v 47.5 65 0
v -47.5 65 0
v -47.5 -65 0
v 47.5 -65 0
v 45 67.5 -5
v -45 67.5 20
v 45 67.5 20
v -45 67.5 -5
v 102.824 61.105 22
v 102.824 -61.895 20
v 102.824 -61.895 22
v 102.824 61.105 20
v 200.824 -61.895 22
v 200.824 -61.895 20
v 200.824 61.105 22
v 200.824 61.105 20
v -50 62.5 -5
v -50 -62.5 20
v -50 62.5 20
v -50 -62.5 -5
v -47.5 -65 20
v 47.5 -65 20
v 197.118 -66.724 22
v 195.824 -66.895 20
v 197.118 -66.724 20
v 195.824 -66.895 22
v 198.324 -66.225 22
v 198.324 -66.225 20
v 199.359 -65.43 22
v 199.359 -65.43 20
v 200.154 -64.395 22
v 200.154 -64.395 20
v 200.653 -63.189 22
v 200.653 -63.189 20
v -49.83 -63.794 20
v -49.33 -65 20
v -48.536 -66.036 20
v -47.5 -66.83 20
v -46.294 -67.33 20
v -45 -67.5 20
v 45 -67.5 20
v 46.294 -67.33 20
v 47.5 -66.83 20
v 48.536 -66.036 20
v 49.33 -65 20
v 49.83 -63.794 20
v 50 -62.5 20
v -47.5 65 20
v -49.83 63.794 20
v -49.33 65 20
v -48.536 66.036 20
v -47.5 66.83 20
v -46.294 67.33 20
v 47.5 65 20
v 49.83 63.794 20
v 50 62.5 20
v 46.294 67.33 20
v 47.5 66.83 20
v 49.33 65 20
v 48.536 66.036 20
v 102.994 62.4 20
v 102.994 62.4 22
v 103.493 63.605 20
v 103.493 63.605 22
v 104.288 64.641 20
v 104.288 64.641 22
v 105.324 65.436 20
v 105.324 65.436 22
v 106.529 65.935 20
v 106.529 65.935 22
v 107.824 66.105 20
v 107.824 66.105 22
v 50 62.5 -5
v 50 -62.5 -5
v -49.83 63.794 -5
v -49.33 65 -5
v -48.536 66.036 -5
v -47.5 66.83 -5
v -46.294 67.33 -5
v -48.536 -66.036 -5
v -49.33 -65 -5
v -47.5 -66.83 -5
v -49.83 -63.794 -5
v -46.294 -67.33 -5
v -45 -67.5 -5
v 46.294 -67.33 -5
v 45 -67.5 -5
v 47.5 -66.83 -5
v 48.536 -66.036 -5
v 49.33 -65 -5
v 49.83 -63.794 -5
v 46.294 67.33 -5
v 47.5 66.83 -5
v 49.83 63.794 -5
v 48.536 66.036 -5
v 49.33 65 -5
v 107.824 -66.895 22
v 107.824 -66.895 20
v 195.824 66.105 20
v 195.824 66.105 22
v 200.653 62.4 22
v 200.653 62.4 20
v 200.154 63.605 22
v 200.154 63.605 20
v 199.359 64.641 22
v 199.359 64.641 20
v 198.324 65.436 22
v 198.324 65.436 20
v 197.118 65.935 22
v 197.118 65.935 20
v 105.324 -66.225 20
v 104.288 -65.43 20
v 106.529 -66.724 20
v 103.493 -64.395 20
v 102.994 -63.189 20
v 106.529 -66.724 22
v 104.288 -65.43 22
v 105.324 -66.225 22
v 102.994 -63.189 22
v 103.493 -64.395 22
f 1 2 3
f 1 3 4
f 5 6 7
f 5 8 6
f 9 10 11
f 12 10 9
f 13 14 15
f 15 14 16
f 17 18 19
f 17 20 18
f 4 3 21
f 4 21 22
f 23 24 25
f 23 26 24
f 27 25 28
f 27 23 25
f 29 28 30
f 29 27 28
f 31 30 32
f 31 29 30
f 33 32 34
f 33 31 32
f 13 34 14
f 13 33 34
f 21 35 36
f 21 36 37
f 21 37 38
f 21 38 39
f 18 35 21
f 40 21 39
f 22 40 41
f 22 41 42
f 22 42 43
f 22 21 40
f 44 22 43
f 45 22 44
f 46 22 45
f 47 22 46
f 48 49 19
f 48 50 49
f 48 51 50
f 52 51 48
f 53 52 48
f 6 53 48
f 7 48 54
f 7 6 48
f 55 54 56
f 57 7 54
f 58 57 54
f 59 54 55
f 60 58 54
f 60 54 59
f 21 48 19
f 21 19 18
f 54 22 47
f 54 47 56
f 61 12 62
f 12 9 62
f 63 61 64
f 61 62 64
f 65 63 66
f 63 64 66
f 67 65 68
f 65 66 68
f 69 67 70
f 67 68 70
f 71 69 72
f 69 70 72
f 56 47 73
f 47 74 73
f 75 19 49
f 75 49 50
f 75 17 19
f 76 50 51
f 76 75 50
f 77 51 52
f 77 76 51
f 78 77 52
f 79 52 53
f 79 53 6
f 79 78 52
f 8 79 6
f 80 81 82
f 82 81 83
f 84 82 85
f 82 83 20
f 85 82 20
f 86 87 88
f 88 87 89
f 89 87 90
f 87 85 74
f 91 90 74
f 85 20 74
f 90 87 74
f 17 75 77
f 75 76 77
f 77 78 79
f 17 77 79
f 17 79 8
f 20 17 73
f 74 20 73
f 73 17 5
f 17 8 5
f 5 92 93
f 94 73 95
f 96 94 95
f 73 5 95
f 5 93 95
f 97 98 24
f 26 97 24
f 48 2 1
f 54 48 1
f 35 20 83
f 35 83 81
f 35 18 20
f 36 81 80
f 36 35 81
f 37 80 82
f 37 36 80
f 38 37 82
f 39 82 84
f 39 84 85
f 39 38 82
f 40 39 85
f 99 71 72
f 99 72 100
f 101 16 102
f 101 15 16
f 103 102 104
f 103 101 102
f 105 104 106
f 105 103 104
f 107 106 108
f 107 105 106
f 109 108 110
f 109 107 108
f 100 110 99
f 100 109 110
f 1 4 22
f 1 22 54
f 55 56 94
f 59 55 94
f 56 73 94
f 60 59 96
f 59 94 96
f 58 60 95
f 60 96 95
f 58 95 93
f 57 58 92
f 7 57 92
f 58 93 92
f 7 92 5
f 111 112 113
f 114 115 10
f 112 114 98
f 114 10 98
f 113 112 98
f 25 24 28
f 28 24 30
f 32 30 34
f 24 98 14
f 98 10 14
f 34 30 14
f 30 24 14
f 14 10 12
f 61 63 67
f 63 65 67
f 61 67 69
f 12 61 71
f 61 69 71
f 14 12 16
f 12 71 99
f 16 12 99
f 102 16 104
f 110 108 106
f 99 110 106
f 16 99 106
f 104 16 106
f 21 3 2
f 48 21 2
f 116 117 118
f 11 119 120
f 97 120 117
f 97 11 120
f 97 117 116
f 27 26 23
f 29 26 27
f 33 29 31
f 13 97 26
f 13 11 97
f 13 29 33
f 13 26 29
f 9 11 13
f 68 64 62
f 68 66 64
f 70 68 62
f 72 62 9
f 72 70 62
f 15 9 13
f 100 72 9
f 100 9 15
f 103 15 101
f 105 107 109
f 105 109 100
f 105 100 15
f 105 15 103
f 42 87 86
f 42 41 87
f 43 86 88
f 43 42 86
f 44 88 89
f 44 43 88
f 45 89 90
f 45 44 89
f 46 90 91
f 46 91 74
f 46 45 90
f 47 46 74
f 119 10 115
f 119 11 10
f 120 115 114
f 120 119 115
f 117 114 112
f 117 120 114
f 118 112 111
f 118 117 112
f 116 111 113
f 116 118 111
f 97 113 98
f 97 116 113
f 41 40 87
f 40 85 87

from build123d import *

# Parameters (mm, degrees)
F0_W     = 100
F0_H     = 135
F1_DEPTH = 5
F2_W     = 100
F2_H     = 135
F2_W_2   = 95
F2_H_2   = 130
F3_DEPTH = 20
F4_R     = 5
F5_W     = 98
F5_H     = 133
F6_DEPTH = 2
F7_R     = 5


with BuildPart() as f1:
    # F0 (on Top) → F1 (new body)
    with BuildSketch(Plane.XY):
        Rectangle(F0_W, F0_H)
    extrude(amount=-F1_DEPTH)

    # F2 (on face) → F3 (join)
    with BuildSketch(Plane.XY):
        Rectangle(F2_W, F2_H)
        Rectangle(F2_W_2, F2_H_2, mode=Mode.SUBTRACT)
    extrude(amount=F3_DEPTH)

    # F4
    f4_edges = [f1.edges().sort_by_distance(p)[0] for p in [
        (50, -67.5, 7.5),
        (-50, -67.5, 7.5),
        (-50, 67.5, 7.5),
        (50, 67.5, 7.5),
    ]]
    fillet(f4_edges, radius=F4_R)


with BuildPart() as f6:
    # F5 (on face) → F6 (new body)
    with BuildSketch(Plane.XY.offset(20)):
        with Locations((151.823523, -0.394557)):
            Rectangle(F5_W, F5_H)
    extrude(amount=F6_DEPTH)

    # F7
    f7_edges = [f6.edges().sort_by_distance(p)[0] for p in [
        (102.823523, -66.894557, 21),
        (200.823523, -66.894557, 21),
        (200.823523, 66.105443, 21),
        (102.823523, 66.105443, 21),
    ]]
    fillet(f7_edges, radius=F7_R)


solid = Compound([f1.part, f6.part])
